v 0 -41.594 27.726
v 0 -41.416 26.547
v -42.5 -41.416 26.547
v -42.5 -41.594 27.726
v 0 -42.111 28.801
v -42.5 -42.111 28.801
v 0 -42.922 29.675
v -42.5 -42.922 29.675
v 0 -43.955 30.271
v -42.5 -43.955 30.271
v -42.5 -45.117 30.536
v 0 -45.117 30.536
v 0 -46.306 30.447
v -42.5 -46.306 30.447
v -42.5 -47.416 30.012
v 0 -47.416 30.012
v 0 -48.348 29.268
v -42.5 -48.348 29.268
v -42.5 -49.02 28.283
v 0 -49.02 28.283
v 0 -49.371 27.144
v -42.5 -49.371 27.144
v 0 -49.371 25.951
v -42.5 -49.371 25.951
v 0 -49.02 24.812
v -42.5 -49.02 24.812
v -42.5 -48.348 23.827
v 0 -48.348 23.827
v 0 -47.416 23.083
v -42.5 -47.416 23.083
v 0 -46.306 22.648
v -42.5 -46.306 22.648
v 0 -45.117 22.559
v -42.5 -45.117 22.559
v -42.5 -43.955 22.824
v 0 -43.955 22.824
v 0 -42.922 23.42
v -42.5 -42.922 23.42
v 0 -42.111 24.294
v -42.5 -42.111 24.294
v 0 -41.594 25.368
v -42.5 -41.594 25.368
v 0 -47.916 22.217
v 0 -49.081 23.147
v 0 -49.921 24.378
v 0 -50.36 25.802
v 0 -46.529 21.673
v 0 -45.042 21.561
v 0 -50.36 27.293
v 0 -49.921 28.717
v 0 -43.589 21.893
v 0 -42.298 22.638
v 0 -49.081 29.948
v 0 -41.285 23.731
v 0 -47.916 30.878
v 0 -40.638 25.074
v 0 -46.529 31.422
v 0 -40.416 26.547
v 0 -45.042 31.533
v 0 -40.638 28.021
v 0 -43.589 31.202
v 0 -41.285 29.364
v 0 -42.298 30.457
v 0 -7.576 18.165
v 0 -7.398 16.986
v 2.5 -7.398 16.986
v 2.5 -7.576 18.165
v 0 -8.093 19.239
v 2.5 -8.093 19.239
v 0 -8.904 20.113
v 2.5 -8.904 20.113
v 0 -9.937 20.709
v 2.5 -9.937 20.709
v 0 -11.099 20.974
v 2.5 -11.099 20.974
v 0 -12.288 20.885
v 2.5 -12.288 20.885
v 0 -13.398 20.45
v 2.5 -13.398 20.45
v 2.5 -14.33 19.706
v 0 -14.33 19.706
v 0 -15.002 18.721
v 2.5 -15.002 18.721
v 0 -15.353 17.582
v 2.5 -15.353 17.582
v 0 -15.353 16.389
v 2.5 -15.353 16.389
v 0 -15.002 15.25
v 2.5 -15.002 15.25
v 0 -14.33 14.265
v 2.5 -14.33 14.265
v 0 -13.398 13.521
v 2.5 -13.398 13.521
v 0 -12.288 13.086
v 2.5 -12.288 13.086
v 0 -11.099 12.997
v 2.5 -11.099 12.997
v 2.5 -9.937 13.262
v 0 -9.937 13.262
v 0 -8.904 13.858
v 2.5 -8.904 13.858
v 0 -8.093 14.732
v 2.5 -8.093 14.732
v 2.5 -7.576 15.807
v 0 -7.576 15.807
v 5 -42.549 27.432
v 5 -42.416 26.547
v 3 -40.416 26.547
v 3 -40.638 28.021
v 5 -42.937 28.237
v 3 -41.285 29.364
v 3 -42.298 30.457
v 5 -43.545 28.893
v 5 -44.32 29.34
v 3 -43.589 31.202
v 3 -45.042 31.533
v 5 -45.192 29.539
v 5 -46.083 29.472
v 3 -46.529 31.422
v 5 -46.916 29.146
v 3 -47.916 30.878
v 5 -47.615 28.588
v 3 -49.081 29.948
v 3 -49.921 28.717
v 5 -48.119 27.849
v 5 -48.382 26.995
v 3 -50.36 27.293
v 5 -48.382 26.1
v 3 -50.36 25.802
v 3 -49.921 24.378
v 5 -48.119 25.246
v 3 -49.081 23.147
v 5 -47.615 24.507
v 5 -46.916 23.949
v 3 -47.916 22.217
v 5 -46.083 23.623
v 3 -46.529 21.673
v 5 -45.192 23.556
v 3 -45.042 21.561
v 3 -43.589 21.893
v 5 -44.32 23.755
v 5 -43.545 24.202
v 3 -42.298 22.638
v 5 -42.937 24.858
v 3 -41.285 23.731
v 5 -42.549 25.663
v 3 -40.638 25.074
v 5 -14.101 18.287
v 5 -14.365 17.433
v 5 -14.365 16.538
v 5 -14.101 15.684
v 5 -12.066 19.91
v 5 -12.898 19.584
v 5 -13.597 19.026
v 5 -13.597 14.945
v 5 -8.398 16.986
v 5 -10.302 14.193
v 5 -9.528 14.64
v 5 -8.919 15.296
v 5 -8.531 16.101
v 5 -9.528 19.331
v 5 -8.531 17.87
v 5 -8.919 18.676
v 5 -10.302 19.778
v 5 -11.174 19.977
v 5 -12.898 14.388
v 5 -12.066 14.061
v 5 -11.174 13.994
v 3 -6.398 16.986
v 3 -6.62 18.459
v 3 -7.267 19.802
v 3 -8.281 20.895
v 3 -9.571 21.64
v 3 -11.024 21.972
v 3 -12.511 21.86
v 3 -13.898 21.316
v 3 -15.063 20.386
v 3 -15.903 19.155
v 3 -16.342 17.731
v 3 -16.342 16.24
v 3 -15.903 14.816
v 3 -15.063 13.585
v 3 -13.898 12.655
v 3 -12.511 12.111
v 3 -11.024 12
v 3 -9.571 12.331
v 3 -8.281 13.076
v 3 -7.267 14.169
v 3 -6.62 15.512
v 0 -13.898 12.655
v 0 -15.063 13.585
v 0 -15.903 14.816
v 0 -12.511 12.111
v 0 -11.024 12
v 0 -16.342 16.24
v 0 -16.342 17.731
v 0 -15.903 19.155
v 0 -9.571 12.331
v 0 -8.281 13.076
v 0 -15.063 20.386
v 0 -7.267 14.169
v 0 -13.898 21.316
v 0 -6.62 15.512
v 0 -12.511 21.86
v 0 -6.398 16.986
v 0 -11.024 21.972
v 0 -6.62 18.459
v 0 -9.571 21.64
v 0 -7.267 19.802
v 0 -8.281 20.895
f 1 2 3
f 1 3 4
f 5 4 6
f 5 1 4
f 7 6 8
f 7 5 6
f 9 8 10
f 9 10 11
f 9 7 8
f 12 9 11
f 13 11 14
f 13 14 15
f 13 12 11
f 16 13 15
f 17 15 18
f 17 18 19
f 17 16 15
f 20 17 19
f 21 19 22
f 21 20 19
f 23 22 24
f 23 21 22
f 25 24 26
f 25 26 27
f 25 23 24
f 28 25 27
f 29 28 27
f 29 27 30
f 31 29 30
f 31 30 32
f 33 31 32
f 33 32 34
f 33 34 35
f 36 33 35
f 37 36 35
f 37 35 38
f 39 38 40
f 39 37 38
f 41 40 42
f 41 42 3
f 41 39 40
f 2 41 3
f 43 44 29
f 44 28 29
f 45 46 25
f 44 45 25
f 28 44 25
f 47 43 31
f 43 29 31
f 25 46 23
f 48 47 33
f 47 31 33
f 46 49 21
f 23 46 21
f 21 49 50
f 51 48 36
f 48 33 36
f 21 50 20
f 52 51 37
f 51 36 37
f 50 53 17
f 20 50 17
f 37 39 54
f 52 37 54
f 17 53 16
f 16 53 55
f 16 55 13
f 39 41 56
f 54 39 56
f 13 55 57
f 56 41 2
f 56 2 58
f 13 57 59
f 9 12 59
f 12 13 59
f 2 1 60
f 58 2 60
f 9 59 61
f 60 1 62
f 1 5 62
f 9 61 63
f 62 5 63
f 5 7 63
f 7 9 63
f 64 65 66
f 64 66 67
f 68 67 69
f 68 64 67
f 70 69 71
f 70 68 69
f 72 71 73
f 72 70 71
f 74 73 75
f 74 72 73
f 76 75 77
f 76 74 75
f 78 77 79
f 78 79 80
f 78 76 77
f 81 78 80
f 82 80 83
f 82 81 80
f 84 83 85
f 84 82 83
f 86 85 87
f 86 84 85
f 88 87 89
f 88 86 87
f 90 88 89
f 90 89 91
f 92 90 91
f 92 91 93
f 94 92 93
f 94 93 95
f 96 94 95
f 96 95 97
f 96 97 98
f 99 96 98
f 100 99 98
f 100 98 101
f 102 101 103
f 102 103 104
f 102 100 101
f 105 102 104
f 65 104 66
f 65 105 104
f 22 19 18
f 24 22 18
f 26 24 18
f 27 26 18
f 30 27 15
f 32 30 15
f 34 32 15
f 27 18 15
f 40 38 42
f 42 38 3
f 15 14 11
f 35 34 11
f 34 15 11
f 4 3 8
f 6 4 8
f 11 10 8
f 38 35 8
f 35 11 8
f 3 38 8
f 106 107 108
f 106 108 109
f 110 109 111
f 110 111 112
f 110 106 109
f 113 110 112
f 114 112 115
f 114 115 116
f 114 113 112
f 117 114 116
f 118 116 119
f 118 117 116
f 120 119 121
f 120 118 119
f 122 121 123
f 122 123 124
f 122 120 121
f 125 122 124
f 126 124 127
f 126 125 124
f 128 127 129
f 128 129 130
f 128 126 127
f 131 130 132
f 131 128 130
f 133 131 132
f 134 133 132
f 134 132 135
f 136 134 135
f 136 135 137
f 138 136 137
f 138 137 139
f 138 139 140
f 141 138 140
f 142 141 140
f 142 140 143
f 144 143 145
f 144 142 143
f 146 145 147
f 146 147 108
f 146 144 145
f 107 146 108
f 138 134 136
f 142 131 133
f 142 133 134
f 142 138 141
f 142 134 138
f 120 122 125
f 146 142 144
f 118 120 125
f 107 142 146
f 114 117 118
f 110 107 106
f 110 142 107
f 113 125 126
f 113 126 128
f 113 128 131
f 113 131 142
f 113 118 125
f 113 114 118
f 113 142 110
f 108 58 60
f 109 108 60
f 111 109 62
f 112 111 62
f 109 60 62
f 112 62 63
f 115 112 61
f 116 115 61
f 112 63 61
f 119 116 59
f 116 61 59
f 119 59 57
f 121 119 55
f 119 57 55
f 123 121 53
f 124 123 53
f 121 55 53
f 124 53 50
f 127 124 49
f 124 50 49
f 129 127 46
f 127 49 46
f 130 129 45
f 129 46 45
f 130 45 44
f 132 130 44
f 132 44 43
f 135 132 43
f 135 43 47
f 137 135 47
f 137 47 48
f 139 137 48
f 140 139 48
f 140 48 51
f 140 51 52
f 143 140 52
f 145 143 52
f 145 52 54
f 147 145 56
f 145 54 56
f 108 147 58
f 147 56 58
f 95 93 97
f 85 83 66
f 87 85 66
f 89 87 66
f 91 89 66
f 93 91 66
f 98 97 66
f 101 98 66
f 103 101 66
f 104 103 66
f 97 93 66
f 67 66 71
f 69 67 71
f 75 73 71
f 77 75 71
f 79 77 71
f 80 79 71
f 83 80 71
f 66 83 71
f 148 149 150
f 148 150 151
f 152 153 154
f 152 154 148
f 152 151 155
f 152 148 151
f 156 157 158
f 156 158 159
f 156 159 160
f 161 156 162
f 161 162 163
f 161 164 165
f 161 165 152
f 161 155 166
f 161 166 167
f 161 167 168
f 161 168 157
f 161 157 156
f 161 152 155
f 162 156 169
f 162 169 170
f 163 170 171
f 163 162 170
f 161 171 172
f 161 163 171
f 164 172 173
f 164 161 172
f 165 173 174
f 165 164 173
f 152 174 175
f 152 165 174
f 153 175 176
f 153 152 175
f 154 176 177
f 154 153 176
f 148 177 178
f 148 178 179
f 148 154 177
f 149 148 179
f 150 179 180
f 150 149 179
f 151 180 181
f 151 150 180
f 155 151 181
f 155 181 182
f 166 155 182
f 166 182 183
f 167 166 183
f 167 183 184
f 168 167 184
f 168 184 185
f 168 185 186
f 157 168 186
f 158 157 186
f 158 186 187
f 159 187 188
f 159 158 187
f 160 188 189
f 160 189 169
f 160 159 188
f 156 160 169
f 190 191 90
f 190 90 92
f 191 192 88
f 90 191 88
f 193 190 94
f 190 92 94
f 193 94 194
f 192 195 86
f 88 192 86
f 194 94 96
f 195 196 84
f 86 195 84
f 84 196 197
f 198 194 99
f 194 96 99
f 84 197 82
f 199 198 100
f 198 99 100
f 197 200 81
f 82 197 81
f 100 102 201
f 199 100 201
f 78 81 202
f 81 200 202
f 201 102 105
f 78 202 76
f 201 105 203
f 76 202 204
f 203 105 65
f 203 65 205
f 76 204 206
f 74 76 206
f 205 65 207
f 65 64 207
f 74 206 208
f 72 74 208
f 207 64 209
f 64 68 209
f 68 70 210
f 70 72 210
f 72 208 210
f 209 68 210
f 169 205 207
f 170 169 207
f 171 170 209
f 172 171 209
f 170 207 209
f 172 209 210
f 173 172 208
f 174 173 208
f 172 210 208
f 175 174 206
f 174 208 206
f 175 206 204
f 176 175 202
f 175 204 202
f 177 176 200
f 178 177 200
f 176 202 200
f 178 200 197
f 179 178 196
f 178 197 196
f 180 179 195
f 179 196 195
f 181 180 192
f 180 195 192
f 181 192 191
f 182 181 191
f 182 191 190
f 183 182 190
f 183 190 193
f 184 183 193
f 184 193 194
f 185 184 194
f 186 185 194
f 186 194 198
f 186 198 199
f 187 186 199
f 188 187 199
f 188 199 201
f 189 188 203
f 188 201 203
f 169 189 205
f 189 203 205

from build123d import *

# Parameters (mm, degrees)
F0_R      = 4
F1_DEPTH  = 42.5
F0_R_2    = 5
F1_FACE_R = 4
F2_DEPTH  = 5
F3_SIZE   = 2
F4_R      = 5
F4_R_2    = 4
F5_DEPTH  = 5
F6_DEPTH  = 2.5
F7_SIZE   = 2


with BuildPart() as f1:
    # F0 (on Right) → F1 (new body)
    with BuildSketch(Plane.YZ):
        with Locations((-45.41593, 26.547479)):
            Circle(F0_R)
    extrude(amount=-F1_DEPTH)

    # F0 (on Right) + F1_face (on face) → F2 (join)
    with BuildSketch(Plane.YZ):
        with Locations((-45.41593, 26.547479)):
            Circle(F0_R_2)
        with Locations((-45.41593, 26.547479)):
            Circle(F0_R, mode=Mode.SUBTRACT)
    with BuildSketch(Plane(origin=(0, -45.41593, 26.547479), x_dir=(0, 1, 0), z_dir=(1, 0, 0))):
        Circle(F1_FACE_R)
    extrude(amount=F2_DEPTH)

    # F3
    f3_edges = [f1.edges().sort_by_distance(p)[0] for p in [
        (5, -50.41593, 26.547479),
    ]]
    chamfer(f3_edges, length=F3_SIZE)


with BuildPart() as f5:
    # F4 (on Right) → F5 (new body)
    with BuildSketch(Plane.YZ):
        with Locations((-11.398076, 16.985593)):
            Circle(F4_R)
        with Locations((-11.398076, 16.985593)):
            Circle(F4_R_2, mode=Mode.SUBTRACT)
        with Locations((-11.398076, 16.985593)):
            Circle(F4_R_2)
    extrude(amount=F5_DEPTH)

    # F4 (on Right) → F6 (cut)
    with BuildSketch(Plane.YZ):
        with Locations((-11.398076, 16.985593)):
            Circle(F4_R_2)
    extrude(amount=F6_DEPTH, mode=Mode.SUBTRACT)

    # F7
    f7_edges = [f5.edges().sort_by_distance(p)[0] for p in [
        (5, -16.398076, 16.985593),
    ]]
    chamfer(f7_edges, length=F7_SIZE)


solid = Compound([f1.part, f5.part])
